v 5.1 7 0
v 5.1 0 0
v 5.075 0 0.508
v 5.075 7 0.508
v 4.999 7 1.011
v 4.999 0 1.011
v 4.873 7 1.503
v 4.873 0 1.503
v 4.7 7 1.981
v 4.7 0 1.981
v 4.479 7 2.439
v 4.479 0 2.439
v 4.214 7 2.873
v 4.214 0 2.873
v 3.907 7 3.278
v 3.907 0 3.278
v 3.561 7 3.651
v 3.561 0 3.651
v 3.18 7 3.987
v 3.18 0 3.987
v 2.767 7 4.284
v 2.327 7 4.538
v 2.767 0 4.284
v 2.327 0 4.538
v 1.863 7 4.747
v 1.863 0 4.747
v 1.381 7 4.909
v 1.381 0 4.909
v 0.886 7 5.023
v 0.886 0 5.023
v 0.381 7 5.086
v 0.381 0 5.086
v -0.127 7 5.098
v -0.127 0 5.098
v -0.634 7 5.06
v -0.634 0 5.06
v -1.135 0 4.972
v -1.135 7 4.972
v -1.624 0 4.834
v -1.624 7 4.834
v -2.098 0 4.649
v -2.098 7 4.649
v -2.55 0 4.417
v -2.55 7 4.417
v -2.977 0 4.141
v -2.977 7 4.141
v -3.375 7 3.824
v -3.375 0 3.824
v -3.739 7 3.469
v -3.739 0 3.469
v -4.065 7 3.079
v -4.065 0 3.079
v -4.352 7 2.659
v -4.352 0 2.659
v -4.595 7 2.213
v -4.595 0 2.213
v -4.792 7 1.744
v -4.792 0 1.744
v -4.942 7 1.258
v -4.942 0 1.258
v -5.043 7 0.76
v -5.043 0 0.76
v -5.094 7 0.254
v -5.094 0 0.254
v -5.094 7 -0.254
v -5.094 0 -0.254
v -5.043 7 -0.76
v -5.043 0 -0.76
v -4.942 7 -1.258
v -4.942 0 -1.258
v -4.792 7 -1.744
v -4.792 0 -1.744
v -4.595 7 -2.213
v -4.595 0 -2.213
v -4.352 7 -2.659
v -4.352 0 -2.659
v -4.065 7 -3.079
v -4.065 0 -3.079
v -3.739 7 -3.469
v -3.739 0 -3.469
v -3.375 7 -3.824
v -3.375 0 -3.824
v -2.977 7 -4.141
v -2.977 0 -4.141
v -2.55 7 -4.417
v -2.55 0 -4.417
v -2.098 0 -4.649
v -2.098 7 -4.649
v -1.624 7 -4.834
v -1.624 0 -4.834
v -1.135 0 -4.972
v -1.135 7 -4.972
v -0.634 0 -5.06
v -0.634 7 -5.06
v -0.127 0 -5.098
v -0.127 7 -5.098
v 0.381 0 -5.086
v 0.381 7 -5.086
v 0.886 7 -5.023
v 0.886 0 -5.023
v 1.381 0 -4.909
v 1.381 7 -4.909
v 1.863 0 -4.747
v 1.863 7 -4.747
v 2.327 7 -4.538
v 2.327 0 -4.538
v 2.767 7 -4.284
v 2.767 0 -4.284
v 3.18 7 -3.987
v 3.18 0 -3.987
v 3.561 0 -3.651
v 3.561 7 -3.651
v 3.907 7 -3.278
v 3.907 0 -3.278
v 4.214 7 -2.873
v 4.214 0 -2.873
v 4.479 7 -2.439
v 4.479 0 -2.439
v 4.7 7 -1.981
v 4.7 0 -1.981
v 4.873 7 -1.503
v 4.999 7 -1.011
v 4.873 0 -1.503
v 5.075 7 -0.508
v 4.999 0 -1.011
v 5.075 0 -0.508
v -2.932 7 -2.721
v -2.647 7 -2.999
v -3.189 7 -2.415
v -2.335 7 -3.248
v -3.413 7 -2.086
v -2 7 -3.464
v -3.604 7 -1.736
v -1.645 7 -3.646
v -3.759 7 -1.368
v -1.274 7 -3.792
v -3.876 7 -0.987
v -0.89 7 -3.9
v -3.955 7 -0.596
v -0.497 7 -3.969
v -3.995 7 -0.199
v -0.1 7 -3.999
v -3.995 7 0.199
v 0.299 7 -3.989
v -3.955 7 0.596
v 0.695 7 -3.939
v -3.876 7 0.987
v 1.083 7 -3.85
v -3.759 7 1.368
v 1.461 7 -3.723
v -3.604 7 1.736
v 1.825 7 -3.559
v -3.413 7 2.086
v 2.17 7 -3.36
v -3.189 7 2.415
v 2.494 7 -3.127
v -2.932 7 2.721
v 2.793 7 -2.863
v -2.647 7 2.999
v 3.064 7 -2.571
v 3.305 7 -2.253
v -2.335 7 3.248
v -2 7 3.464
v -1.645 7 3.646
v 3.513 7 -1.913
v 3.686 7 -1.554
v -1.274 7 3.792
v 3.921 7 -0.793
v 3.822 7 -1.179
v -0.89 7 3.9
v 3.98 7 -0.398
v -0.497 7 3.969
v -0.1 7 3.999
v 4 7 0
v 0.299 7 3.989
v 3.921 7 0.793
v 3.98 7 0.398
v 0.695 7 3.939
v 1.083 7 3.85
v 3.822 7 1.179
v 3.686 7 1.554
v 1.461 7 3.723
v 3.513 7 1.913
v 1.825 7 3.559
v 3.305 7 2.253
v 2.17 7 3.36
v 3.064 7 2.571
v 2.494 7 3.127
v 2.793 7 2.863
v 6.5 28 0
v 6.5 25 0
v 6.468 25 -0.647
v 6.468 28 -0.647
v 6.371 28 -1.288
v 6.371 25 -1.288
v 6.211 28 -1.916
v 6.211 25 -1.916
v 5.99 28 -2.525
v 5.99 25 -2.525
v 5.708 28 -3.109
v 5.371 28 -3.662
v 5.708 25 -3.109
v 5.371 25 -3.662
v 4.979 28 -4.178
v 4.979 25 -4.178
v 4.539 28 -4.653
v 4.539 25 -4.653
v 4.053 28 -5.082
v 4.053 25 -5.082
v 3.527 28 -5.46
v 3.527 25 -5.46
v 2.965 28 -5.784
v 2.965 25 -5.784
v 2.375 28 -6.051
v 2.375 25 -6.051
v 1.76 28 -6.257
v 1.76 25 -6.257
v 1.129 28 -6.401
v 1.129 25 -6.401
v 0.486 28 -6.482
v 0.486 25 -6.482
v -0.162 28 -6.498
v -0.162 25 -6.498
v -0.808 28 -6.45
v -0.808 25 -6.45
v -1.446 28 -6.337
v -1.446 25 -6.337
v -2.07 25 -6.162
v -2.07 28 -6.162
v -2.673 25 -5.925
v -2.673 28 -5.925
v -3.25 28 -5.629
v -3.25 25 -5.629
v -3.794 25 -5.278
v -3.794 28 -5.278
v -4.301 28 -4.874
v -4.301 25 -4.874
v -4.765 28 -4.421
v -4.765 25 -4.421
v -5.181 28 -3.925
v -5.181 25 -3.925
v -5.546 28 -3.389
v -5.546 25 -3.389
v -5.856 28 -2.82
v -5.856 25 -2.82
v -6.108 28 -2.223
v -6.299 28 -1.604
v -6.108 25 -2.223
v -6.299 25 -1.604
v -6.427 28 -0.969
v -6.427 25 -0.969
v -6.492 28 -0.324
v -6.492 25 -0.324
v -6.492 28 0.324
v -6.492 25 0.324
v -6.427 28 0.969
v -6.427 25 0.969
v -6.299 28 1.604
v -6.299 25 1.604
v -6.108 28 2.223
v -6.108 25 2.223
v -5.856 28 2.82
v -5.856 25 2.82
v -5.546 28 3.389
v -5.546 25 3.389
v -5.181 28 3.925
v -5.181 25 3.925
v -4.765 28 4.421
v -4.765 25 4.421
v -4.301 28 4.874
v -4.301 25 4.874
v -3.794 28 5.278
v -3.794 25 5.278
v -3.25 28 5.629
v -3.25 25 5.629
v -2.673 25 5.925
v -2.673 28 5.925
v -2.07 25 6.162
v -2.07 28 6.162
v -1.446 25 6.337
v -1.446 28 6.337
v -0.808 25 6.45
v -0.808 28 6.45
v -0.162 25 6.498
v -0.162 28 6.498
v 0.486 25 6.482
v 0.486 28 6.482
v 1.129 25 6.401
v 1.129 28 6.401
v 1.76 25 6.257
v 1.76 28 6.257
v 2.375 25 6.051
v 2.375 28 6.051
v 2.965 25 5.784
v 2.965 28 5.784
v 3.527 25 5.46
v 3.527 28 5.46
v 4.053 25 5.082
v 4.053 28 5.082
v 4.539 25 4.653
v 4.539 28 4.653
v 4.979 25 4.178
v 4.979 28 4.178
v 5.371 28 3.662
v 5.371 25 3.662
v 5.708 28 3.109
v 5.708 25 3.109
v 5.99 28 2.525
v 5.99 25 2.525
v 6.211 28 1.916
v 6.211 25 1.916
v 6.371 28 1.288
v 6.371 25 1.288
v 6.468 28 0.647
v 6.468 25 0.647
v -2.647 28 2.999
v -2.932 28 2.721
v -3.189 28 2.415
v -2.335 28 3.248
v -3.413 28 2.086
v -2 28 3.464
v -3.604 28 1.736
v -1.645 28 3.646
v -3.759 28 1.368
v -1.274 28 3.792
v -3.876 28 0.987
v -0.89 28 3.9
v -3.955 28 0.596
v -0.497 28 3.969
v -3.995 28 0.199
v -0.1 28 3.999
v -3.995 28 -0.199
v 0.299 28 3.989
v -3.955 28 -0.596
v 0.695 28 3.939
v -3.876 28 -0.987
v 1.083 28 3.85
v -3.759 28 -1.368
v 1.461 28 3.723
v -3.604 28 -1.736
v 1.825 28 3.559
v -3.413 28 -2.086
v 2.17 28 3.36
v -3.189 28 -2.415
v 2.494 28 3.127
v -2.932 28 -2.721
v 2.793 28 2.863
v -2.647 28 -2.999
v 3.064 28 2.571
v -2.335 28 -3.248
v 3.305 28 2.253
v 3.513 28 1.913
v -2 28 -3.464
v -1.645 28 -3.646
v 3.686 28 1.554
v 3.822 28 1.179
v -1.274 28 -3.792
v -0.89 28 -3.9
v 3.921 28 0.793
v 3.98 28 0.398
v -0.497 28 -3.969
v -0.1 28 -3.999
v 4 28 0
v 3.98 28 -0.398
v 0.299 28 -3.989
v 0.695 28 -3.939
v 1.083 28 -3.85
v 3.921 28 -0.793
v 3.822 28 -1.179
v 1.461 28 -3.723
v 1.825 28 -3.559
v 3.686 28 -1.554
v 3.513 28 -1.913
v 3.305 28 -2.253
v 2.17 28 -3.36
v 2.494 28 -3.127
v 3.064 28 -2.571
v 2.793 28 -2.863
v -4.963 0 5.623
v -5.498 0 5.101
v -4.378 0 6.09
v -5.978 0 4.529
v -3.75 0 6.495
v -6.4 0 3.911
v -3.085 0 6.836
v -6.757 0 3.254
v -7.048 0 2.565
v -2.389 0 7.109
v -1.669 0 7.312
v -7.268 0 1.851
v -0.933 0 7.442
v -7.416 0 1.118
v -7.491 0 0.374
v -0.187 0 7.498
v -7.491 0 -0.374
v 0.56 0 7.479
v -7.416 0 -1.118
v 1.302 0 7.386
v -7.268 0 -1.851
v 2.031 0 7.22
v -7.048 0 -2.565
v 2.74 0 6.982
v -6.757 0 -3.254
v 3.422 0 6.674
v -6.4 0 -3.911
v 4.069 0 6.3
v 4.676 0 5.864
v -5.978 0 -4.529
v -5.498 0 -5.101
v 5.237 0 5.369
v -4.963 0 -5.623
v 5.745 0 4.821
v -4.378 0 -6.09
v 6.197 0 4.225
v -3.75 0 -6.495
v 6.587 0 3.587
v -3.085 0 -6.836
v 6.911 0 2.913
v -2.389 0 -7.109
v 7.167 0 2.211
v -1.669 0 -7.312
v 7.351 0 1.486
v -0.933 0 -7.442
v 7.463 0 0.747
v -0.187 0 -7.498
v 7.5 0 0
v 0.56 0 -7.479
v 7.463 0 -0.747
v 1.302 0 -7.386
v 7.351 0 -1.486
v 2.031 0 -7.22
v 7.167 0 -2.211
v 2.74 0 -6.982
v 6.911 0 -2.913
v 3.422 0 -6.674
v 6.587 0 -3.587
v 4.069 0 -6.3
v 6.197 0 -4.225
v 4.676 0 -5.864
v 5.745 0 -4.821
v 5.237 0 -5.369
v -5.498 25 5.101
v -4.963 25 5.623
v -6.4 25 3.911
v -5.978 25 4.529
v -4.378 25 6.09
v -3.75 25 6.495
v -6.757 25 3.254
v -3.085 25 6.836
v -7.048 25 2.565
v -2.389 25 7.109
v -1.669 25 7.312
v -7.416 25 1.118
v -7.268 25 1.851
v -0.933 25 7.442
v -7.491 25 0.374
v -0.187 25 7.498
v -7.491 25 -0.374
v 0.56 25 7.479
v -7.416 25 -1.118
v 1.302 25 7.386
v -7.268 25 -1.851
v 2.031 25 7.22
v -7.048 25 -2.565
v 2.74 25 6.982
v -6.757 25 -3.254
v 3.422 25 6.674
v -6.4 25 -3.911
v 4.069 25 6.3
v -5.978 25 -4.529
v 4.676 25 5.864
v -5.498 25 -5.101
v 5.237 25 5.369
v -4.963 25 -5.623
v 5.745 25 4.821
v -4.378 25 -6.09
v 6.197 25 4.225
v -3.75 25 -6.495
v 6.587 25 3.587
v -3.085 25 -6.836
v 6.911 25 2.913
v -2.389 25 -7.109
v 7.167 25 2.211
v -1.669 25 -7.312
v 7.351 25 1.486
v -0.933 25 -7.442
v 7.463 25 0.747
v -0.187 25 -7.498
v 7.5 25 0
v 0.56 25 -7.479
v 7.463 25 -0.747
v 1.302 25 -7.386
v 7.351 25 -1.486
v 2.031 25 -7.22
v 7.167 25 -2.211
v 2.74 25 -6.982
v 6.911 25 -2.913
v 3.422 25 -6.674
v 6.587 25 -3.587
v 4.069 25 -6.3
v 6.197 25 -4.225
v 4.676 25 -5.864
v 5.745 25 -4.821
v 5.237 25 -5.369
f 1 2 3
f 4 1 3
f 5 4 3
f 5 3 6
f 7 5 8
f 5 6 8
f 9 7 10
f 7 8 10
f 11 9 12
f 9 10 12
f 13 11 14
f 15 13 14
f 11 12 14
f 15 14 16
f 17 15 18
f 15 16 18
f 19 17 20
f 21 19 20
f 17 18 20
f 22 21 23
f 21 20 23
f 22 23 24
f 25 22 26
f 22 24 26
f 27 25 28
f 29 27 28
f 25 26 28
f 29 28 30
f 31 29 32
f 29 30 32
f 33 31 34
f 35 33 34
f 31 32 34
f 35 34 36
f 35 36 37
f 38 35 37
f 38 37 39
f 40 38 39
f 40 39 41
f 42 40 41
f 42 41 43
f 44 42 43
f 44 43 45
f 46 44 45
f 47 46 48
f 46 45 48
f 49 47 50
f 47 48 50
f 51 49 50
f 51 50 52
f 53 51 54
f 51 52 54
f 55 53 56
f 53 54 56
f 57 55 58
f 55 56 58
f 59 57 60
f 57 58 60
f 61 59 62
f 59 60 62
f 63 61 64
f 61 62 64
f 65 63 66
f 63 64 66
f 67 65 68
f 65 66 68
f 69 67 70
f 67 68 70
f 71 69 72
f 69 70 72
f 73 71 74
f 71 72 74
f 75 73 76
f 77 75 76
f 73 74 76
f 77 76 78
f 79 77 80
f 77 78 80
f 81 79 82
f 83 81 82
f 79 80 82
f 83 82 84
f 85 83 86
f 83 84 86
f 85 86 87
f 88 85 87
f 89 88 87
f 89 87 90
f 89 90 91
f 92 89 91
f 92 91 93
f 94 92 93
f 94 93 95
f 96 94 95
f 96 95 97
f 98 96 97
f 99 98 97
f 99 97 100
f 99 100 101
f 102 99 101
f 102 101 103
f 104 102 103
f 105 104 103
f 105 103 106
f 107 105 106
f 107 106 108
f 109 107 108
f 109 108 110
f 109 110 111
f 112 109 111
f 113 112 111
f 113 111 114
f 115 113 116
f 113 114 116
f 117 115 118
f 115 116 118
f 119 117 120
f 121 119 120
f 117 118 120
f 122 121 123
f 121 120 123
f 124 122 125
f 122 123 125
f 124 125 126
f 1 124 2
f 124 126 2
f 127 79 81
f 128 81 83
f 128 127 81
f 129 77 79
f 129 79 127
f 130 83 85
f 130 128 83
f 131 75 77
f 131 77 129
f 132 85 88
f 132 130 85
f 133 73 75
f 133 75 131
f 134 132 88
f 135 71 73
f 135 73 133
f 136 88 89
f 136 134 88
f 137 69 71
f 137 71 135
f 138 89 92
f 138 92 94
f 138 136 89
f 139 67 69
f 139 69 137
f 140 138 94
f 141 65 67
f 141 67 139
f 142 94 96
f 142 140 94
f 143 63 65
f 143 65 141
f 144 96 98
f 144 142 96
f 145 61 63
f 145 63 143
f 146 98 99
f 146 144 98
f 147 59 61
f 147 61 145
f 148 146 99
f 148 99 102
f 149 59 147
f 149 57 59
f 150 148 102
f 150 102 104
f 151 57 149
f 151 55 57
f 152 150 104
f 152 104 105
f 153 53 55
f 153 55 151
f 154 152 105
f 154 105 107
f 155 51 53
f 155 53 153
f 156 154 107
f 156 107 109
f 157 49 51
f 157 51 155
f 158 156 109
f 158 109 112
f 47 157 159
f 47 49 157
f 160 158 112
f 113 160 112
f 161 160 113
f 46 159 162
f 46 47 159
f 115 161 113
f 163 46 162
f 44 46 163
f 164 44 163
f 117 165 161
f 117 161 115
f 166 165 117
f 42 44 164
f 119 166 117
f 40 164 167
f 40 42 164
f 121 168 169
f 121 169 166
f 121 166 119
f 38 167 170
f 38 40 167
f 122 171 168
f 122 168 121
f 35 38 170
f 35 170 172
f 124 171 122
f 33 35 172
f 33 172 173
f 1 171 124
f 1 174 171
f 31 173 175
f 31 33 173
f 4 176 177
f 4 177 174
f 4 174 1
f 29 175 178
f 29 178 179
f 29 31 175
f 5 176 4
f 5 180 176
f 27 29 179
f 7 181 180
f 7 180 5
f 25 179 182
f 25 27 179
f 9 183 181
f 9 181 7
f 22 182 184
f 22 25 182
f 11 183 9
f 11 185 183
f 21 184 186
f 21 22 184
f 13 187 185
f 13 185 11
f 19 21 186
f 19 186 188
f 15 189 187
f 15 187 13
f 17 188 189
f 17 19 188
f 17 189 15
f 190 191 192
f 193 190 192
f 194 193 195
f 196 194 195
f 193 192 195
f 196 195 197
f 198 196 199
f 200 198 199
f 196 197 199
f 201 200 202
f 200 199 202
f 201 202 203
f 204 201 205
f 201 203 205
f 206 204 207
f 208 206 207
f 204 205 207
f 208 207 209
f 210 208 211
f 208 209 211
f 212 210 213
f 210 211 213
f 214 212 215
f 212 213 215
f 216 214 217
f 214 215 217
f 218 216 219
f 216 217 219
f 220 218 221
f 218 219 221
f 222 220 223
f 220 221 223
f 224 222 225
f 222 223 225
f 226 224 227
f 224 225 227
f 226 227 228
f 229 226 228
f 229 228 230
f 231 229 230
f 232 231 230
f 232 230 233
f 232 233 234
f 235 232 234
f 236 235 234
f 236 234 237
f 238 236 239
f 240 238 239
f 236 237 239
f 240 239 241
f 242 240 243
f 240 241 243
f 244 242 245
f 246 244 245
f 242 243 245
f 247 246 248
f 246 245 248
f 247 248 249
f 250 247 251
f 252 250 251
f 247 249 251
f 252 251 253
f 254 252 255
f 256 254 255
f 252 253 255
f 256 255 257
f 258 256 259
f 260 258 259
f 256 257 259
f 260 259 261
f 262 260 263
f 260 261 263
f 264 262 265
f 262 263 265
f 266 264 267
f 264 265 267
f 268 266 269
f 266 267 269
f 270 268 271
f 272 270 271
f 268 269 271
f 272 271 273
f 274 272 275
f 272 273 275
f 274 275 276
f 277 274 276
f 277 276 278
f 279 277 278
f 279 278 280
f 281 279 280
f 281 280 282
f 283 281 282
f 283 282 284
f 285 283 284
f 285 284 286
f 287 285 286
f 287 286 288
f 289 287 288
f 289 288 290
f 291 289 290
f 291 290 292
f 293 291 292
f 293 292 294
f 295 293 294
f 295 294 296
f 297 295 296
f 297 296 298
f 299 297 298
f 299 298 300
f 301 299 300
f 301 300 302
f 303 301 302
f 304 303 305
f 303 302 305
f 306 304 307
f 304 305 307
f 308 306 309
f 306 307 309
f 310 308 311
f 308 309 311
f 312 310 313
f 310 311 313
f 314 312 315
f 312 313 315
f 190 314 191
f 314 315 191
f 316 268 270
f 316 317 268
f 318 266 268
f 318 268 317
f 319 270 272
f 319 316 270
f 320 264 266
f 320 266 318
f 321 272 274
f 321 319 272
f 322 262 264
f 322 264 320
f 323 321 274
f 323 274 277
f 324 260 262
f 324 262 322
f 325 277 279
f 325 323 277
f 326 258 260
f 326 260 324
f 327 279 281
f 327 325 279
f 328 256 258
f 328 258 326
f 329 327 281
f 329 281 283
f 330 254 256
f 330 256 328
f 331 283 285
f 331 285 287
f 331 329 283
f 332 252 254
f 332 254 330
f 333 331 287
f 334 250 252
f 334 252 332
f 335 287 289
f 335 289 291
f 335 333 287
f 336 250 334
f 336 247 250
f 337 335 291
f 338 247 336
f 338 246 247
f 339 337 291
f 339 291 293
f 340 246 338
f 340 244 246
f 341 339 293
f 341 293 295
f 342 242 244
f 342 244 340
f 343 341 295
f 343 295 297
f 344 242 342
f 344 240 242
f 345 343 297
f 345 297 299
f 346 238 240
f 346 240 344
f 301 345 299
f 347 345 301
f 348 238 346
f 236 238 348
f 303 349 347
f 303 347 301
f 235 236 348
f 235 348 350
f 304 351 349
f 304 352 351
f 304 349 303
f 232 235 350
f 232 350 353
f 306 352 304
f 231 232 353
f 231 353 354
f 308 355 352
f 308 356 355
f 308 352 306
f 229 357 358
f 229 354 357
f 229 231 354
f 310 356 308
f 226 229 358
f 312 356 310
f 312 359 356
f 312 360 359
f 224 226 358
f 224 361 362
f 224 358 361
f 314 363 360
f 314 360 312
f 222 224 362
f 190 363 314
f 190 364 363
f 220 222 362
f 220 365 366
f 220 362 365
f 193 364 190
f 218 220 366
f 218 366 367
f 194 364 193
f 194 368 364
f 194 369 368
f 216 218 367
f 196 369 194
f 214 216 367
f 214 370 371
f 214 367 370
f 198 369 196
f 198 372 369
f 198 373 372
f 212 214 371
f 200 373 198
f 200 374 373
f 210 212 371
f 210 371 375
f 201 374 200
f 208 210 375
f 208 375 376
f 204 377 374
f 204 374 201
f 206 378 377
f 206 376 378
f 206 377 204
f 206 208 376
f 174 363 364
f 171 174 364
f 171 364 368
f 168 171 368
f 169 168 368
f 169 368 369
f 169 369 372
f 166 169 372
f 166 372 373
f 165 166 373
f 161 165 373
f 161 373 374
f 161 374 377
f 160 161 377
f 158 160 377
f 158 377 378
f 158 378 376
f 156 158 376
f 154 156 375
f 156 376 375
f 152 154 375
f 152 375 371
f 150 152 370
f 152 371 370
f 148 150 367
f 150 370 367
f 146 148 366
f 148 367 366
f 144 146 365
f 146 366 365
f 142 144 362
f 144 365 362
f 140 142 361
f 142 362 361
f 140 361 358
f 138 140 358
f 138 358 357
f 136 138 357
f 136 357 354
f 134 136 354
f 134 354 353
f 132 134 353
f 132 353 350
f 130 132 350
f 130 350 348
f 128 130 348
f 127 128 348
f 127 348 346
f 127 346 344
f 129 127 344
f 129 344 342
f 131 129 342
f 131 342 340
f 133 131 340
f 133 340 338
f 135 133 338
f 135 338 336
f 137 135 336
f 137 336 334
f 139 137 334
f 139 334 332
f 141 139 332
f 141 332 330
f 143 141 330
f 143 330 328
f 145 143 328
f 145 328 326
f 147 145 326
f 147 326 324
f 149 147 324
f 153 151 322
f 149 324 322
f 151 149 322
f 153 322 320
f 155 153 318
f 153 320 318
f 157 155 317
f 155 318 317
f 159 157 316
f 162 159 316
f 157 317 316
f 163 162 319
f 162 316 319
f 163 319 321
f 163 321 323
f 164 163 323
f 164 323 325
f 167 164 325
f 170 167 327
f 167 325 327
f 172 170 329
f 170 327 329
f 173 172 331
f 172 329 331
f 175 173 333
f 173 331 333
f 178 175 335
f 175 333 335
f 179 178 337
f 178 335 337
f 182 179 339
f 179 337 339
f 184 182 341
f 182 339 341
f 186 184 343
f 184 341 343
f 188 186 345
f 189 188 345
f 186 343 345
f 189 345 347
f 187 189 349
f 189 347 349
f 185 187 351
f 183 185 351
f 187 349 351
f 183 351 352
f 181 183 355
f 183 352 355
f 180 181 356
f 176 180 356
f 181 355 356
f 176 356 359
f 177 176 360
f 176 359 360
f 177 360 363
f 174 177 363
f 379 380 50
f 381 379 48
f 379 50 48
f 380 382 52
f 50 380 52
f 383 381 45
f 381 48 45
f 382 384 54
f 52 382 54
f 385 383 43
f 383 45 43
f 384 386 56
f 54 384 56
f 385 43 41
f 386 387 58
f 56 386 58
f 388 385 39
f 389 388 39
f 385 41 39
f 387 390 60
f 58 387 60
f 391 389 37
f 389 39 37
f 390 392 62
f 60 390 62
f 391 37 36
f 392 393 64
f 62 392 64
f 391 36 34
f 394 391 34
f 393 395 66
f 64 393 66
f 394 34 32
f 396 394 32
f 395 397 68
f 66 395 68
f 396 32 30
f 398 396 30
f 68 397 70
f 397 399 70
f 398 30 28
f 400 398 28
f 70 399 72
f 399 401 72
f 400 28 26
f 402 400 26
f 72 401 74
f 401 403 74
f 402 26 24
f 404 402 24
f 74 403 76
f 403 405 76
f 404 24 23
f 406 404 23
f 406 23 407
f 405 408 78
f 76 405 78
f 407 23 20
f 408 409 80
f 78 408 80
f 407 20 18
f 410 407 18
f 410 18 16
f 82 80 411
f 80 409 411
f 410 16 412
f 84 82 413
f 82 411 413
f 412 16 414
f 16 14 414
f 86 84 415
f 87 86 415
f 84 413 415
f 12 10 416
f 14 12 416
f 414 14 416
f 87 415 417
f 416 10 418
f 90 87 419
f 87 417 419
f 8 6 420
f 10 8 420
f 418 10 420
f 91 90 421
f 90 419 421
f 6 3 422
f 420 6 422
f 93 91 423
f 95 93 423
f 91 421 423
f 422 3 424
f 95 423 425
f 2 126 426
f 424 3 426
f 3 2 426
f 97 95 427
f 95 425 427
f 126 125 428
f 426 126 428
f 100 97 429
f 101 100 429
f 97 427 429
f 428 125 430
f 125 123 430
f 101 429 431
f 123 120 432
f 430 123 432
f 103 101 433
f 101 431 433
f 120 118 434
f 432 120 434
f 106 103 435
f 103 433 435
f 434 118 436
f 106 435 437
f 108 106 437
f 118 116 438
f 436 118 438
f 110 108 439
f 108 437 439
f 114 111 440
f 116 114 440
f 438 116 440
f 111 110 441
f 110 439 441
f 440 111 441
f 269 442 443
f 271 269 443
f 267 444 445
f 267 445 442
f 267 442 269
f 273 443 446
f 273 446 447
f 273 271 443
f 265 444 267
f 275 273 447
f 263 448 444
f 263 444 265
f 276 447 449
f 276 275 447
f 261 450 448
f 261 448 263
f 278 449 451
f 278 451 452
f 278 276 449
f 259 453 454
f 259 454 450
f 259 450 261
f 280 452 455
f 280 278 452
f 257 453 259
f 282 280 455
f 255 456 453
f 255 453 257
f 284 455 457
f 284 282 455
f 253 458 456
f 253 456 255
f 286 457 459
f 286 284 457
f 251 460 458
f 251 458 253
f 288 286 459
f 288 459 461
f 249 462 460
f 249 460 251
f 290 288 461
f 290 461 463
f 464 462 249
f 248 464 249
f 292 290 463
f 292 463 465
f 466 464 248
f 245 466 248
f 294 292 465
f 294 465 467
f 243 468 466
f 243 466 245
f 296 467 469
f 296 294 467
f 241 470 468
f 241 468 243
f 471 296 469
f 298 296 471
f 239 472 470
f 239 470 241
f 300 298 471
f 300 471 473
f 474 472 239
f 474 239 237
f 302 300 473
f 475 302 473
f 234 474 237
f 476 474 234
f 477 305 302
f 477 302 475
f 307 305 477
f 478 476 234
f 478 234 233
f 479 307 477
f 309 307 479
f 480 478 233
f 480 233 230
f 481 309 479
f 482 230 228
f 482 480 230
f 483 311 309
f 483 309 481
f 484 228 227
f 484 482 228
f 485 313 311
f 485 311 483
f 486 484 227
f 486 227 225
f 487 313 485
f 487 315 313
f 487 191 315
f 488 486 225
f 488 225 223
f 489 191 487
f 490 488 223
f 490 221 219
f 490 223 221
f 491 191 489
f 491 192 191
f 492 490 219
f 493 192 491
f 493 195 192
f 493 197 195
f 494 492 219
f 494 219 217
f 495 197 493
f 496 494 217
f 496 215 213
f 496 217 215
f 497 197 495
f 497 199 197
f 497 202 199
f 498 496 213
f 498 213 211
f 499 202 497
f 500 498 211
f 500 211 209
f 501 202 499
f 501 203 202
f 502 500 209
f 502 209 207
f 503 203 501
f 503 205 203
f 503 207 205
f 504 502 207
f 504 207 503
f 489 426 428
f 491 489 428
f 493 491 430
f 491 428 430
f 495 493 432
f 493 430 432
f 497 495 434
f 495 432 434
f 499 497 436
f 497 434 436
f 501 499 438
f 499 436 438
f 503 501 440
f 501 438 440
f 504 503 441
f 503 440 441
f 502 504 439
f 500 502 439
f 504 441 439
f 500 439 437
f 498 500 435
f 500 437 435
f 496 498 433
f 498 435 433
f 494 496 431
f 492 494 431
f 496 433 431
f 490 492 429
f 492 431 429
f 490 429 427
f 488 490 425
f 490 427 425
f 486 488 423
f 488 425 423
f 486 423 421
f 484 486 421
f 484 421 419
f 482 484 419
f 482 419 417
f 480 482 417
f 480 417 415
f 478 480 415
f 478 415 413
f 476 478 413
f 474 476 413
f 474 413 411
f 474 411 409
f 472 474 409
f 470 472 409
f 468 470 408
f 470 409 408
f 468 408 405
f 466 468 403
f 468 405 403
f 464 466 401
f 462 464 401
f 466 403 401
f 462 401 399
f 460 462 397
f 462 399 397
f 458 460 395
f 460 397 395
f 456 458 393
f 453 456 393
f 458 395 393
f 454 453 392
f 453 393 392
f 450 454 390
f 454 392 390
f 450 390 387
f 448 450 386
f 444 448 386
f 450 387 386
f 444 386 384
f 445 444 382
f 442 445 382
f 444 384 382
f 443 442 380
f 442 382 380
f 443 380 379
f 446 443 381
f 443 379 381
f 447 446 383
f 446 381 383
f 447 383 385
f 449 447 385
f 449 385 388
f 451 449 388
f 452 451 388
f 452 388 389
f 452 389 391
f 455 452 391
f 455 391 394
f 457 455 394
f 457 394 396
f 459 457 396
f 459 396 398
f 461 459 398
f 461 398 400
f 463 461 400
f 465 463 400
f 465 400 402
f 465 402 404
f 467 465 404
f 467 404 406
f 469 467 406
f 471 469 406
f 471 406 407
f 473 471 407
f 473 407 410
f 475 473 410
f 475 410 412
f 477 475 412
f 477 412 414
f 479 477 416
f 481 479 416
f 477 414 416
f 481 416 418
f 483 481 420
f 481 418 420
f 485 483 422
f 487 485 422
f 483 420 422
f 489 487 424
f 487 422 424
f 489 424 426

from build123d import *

# Parameters (mm, degrees)
SKETCH1_R           = 7.5
BOSS_EXTRUDE1_DEPTH = 25
SKETCH2_R           = 6.5
BOSS_EXTRUDE2_DEPTH = 3
SKETCH3_R           = 5.1
CUT_EXTRUDE1_DEPTH  = 7
SKETCH4_R           = 4
CUT_EXTRUDE2_DEPTH  = 29


with BuildPart() as part:
    # Sketch1 → Boss-Extrude1 (new body)
    with BuildSketch(Plane(origin=(0, 0, 0), x_dir=(1, 0, 0), z_dir=(0, 1, 0))):
        Circle(SKETCH1_R)
    extrude(amount=BOSS_EXTRUDE1_DEPTH)

    # Sketch2 → Boss-Extrude2 (add)
    with BuildSketch(Plane(origin=(0, 25, 0), x_dir=(1, 0, 0), z_dir=(0, 1, 0))):
        Circle(SKETCH2_R)
    extrude(amount=BOSS_EXTRUDE2_DEPTH)

    # Sketch3 → Cut-Extrude1 (cut)
    with BuildSketch(Plane.XZ):
        Circle(SKETCH3_R)
    extrude(amount=-CUT_EXTRUDE1_DEPTH, mode=Mode.SUBTRACT)

    # Sketch4 → Cut-Extrude2 (cut, through all)
    with BuildSketch(Plane(origin=(0, 28, 0), x_dir=(1, 0, 0), z_dir=(0, 1, 0))):
        Circle(SKETCH4_R)
    extrude(amount=-CUT_EXTRUDE2_DEPTH, mode=Mode.SUBTRACT)


solid = part.part
